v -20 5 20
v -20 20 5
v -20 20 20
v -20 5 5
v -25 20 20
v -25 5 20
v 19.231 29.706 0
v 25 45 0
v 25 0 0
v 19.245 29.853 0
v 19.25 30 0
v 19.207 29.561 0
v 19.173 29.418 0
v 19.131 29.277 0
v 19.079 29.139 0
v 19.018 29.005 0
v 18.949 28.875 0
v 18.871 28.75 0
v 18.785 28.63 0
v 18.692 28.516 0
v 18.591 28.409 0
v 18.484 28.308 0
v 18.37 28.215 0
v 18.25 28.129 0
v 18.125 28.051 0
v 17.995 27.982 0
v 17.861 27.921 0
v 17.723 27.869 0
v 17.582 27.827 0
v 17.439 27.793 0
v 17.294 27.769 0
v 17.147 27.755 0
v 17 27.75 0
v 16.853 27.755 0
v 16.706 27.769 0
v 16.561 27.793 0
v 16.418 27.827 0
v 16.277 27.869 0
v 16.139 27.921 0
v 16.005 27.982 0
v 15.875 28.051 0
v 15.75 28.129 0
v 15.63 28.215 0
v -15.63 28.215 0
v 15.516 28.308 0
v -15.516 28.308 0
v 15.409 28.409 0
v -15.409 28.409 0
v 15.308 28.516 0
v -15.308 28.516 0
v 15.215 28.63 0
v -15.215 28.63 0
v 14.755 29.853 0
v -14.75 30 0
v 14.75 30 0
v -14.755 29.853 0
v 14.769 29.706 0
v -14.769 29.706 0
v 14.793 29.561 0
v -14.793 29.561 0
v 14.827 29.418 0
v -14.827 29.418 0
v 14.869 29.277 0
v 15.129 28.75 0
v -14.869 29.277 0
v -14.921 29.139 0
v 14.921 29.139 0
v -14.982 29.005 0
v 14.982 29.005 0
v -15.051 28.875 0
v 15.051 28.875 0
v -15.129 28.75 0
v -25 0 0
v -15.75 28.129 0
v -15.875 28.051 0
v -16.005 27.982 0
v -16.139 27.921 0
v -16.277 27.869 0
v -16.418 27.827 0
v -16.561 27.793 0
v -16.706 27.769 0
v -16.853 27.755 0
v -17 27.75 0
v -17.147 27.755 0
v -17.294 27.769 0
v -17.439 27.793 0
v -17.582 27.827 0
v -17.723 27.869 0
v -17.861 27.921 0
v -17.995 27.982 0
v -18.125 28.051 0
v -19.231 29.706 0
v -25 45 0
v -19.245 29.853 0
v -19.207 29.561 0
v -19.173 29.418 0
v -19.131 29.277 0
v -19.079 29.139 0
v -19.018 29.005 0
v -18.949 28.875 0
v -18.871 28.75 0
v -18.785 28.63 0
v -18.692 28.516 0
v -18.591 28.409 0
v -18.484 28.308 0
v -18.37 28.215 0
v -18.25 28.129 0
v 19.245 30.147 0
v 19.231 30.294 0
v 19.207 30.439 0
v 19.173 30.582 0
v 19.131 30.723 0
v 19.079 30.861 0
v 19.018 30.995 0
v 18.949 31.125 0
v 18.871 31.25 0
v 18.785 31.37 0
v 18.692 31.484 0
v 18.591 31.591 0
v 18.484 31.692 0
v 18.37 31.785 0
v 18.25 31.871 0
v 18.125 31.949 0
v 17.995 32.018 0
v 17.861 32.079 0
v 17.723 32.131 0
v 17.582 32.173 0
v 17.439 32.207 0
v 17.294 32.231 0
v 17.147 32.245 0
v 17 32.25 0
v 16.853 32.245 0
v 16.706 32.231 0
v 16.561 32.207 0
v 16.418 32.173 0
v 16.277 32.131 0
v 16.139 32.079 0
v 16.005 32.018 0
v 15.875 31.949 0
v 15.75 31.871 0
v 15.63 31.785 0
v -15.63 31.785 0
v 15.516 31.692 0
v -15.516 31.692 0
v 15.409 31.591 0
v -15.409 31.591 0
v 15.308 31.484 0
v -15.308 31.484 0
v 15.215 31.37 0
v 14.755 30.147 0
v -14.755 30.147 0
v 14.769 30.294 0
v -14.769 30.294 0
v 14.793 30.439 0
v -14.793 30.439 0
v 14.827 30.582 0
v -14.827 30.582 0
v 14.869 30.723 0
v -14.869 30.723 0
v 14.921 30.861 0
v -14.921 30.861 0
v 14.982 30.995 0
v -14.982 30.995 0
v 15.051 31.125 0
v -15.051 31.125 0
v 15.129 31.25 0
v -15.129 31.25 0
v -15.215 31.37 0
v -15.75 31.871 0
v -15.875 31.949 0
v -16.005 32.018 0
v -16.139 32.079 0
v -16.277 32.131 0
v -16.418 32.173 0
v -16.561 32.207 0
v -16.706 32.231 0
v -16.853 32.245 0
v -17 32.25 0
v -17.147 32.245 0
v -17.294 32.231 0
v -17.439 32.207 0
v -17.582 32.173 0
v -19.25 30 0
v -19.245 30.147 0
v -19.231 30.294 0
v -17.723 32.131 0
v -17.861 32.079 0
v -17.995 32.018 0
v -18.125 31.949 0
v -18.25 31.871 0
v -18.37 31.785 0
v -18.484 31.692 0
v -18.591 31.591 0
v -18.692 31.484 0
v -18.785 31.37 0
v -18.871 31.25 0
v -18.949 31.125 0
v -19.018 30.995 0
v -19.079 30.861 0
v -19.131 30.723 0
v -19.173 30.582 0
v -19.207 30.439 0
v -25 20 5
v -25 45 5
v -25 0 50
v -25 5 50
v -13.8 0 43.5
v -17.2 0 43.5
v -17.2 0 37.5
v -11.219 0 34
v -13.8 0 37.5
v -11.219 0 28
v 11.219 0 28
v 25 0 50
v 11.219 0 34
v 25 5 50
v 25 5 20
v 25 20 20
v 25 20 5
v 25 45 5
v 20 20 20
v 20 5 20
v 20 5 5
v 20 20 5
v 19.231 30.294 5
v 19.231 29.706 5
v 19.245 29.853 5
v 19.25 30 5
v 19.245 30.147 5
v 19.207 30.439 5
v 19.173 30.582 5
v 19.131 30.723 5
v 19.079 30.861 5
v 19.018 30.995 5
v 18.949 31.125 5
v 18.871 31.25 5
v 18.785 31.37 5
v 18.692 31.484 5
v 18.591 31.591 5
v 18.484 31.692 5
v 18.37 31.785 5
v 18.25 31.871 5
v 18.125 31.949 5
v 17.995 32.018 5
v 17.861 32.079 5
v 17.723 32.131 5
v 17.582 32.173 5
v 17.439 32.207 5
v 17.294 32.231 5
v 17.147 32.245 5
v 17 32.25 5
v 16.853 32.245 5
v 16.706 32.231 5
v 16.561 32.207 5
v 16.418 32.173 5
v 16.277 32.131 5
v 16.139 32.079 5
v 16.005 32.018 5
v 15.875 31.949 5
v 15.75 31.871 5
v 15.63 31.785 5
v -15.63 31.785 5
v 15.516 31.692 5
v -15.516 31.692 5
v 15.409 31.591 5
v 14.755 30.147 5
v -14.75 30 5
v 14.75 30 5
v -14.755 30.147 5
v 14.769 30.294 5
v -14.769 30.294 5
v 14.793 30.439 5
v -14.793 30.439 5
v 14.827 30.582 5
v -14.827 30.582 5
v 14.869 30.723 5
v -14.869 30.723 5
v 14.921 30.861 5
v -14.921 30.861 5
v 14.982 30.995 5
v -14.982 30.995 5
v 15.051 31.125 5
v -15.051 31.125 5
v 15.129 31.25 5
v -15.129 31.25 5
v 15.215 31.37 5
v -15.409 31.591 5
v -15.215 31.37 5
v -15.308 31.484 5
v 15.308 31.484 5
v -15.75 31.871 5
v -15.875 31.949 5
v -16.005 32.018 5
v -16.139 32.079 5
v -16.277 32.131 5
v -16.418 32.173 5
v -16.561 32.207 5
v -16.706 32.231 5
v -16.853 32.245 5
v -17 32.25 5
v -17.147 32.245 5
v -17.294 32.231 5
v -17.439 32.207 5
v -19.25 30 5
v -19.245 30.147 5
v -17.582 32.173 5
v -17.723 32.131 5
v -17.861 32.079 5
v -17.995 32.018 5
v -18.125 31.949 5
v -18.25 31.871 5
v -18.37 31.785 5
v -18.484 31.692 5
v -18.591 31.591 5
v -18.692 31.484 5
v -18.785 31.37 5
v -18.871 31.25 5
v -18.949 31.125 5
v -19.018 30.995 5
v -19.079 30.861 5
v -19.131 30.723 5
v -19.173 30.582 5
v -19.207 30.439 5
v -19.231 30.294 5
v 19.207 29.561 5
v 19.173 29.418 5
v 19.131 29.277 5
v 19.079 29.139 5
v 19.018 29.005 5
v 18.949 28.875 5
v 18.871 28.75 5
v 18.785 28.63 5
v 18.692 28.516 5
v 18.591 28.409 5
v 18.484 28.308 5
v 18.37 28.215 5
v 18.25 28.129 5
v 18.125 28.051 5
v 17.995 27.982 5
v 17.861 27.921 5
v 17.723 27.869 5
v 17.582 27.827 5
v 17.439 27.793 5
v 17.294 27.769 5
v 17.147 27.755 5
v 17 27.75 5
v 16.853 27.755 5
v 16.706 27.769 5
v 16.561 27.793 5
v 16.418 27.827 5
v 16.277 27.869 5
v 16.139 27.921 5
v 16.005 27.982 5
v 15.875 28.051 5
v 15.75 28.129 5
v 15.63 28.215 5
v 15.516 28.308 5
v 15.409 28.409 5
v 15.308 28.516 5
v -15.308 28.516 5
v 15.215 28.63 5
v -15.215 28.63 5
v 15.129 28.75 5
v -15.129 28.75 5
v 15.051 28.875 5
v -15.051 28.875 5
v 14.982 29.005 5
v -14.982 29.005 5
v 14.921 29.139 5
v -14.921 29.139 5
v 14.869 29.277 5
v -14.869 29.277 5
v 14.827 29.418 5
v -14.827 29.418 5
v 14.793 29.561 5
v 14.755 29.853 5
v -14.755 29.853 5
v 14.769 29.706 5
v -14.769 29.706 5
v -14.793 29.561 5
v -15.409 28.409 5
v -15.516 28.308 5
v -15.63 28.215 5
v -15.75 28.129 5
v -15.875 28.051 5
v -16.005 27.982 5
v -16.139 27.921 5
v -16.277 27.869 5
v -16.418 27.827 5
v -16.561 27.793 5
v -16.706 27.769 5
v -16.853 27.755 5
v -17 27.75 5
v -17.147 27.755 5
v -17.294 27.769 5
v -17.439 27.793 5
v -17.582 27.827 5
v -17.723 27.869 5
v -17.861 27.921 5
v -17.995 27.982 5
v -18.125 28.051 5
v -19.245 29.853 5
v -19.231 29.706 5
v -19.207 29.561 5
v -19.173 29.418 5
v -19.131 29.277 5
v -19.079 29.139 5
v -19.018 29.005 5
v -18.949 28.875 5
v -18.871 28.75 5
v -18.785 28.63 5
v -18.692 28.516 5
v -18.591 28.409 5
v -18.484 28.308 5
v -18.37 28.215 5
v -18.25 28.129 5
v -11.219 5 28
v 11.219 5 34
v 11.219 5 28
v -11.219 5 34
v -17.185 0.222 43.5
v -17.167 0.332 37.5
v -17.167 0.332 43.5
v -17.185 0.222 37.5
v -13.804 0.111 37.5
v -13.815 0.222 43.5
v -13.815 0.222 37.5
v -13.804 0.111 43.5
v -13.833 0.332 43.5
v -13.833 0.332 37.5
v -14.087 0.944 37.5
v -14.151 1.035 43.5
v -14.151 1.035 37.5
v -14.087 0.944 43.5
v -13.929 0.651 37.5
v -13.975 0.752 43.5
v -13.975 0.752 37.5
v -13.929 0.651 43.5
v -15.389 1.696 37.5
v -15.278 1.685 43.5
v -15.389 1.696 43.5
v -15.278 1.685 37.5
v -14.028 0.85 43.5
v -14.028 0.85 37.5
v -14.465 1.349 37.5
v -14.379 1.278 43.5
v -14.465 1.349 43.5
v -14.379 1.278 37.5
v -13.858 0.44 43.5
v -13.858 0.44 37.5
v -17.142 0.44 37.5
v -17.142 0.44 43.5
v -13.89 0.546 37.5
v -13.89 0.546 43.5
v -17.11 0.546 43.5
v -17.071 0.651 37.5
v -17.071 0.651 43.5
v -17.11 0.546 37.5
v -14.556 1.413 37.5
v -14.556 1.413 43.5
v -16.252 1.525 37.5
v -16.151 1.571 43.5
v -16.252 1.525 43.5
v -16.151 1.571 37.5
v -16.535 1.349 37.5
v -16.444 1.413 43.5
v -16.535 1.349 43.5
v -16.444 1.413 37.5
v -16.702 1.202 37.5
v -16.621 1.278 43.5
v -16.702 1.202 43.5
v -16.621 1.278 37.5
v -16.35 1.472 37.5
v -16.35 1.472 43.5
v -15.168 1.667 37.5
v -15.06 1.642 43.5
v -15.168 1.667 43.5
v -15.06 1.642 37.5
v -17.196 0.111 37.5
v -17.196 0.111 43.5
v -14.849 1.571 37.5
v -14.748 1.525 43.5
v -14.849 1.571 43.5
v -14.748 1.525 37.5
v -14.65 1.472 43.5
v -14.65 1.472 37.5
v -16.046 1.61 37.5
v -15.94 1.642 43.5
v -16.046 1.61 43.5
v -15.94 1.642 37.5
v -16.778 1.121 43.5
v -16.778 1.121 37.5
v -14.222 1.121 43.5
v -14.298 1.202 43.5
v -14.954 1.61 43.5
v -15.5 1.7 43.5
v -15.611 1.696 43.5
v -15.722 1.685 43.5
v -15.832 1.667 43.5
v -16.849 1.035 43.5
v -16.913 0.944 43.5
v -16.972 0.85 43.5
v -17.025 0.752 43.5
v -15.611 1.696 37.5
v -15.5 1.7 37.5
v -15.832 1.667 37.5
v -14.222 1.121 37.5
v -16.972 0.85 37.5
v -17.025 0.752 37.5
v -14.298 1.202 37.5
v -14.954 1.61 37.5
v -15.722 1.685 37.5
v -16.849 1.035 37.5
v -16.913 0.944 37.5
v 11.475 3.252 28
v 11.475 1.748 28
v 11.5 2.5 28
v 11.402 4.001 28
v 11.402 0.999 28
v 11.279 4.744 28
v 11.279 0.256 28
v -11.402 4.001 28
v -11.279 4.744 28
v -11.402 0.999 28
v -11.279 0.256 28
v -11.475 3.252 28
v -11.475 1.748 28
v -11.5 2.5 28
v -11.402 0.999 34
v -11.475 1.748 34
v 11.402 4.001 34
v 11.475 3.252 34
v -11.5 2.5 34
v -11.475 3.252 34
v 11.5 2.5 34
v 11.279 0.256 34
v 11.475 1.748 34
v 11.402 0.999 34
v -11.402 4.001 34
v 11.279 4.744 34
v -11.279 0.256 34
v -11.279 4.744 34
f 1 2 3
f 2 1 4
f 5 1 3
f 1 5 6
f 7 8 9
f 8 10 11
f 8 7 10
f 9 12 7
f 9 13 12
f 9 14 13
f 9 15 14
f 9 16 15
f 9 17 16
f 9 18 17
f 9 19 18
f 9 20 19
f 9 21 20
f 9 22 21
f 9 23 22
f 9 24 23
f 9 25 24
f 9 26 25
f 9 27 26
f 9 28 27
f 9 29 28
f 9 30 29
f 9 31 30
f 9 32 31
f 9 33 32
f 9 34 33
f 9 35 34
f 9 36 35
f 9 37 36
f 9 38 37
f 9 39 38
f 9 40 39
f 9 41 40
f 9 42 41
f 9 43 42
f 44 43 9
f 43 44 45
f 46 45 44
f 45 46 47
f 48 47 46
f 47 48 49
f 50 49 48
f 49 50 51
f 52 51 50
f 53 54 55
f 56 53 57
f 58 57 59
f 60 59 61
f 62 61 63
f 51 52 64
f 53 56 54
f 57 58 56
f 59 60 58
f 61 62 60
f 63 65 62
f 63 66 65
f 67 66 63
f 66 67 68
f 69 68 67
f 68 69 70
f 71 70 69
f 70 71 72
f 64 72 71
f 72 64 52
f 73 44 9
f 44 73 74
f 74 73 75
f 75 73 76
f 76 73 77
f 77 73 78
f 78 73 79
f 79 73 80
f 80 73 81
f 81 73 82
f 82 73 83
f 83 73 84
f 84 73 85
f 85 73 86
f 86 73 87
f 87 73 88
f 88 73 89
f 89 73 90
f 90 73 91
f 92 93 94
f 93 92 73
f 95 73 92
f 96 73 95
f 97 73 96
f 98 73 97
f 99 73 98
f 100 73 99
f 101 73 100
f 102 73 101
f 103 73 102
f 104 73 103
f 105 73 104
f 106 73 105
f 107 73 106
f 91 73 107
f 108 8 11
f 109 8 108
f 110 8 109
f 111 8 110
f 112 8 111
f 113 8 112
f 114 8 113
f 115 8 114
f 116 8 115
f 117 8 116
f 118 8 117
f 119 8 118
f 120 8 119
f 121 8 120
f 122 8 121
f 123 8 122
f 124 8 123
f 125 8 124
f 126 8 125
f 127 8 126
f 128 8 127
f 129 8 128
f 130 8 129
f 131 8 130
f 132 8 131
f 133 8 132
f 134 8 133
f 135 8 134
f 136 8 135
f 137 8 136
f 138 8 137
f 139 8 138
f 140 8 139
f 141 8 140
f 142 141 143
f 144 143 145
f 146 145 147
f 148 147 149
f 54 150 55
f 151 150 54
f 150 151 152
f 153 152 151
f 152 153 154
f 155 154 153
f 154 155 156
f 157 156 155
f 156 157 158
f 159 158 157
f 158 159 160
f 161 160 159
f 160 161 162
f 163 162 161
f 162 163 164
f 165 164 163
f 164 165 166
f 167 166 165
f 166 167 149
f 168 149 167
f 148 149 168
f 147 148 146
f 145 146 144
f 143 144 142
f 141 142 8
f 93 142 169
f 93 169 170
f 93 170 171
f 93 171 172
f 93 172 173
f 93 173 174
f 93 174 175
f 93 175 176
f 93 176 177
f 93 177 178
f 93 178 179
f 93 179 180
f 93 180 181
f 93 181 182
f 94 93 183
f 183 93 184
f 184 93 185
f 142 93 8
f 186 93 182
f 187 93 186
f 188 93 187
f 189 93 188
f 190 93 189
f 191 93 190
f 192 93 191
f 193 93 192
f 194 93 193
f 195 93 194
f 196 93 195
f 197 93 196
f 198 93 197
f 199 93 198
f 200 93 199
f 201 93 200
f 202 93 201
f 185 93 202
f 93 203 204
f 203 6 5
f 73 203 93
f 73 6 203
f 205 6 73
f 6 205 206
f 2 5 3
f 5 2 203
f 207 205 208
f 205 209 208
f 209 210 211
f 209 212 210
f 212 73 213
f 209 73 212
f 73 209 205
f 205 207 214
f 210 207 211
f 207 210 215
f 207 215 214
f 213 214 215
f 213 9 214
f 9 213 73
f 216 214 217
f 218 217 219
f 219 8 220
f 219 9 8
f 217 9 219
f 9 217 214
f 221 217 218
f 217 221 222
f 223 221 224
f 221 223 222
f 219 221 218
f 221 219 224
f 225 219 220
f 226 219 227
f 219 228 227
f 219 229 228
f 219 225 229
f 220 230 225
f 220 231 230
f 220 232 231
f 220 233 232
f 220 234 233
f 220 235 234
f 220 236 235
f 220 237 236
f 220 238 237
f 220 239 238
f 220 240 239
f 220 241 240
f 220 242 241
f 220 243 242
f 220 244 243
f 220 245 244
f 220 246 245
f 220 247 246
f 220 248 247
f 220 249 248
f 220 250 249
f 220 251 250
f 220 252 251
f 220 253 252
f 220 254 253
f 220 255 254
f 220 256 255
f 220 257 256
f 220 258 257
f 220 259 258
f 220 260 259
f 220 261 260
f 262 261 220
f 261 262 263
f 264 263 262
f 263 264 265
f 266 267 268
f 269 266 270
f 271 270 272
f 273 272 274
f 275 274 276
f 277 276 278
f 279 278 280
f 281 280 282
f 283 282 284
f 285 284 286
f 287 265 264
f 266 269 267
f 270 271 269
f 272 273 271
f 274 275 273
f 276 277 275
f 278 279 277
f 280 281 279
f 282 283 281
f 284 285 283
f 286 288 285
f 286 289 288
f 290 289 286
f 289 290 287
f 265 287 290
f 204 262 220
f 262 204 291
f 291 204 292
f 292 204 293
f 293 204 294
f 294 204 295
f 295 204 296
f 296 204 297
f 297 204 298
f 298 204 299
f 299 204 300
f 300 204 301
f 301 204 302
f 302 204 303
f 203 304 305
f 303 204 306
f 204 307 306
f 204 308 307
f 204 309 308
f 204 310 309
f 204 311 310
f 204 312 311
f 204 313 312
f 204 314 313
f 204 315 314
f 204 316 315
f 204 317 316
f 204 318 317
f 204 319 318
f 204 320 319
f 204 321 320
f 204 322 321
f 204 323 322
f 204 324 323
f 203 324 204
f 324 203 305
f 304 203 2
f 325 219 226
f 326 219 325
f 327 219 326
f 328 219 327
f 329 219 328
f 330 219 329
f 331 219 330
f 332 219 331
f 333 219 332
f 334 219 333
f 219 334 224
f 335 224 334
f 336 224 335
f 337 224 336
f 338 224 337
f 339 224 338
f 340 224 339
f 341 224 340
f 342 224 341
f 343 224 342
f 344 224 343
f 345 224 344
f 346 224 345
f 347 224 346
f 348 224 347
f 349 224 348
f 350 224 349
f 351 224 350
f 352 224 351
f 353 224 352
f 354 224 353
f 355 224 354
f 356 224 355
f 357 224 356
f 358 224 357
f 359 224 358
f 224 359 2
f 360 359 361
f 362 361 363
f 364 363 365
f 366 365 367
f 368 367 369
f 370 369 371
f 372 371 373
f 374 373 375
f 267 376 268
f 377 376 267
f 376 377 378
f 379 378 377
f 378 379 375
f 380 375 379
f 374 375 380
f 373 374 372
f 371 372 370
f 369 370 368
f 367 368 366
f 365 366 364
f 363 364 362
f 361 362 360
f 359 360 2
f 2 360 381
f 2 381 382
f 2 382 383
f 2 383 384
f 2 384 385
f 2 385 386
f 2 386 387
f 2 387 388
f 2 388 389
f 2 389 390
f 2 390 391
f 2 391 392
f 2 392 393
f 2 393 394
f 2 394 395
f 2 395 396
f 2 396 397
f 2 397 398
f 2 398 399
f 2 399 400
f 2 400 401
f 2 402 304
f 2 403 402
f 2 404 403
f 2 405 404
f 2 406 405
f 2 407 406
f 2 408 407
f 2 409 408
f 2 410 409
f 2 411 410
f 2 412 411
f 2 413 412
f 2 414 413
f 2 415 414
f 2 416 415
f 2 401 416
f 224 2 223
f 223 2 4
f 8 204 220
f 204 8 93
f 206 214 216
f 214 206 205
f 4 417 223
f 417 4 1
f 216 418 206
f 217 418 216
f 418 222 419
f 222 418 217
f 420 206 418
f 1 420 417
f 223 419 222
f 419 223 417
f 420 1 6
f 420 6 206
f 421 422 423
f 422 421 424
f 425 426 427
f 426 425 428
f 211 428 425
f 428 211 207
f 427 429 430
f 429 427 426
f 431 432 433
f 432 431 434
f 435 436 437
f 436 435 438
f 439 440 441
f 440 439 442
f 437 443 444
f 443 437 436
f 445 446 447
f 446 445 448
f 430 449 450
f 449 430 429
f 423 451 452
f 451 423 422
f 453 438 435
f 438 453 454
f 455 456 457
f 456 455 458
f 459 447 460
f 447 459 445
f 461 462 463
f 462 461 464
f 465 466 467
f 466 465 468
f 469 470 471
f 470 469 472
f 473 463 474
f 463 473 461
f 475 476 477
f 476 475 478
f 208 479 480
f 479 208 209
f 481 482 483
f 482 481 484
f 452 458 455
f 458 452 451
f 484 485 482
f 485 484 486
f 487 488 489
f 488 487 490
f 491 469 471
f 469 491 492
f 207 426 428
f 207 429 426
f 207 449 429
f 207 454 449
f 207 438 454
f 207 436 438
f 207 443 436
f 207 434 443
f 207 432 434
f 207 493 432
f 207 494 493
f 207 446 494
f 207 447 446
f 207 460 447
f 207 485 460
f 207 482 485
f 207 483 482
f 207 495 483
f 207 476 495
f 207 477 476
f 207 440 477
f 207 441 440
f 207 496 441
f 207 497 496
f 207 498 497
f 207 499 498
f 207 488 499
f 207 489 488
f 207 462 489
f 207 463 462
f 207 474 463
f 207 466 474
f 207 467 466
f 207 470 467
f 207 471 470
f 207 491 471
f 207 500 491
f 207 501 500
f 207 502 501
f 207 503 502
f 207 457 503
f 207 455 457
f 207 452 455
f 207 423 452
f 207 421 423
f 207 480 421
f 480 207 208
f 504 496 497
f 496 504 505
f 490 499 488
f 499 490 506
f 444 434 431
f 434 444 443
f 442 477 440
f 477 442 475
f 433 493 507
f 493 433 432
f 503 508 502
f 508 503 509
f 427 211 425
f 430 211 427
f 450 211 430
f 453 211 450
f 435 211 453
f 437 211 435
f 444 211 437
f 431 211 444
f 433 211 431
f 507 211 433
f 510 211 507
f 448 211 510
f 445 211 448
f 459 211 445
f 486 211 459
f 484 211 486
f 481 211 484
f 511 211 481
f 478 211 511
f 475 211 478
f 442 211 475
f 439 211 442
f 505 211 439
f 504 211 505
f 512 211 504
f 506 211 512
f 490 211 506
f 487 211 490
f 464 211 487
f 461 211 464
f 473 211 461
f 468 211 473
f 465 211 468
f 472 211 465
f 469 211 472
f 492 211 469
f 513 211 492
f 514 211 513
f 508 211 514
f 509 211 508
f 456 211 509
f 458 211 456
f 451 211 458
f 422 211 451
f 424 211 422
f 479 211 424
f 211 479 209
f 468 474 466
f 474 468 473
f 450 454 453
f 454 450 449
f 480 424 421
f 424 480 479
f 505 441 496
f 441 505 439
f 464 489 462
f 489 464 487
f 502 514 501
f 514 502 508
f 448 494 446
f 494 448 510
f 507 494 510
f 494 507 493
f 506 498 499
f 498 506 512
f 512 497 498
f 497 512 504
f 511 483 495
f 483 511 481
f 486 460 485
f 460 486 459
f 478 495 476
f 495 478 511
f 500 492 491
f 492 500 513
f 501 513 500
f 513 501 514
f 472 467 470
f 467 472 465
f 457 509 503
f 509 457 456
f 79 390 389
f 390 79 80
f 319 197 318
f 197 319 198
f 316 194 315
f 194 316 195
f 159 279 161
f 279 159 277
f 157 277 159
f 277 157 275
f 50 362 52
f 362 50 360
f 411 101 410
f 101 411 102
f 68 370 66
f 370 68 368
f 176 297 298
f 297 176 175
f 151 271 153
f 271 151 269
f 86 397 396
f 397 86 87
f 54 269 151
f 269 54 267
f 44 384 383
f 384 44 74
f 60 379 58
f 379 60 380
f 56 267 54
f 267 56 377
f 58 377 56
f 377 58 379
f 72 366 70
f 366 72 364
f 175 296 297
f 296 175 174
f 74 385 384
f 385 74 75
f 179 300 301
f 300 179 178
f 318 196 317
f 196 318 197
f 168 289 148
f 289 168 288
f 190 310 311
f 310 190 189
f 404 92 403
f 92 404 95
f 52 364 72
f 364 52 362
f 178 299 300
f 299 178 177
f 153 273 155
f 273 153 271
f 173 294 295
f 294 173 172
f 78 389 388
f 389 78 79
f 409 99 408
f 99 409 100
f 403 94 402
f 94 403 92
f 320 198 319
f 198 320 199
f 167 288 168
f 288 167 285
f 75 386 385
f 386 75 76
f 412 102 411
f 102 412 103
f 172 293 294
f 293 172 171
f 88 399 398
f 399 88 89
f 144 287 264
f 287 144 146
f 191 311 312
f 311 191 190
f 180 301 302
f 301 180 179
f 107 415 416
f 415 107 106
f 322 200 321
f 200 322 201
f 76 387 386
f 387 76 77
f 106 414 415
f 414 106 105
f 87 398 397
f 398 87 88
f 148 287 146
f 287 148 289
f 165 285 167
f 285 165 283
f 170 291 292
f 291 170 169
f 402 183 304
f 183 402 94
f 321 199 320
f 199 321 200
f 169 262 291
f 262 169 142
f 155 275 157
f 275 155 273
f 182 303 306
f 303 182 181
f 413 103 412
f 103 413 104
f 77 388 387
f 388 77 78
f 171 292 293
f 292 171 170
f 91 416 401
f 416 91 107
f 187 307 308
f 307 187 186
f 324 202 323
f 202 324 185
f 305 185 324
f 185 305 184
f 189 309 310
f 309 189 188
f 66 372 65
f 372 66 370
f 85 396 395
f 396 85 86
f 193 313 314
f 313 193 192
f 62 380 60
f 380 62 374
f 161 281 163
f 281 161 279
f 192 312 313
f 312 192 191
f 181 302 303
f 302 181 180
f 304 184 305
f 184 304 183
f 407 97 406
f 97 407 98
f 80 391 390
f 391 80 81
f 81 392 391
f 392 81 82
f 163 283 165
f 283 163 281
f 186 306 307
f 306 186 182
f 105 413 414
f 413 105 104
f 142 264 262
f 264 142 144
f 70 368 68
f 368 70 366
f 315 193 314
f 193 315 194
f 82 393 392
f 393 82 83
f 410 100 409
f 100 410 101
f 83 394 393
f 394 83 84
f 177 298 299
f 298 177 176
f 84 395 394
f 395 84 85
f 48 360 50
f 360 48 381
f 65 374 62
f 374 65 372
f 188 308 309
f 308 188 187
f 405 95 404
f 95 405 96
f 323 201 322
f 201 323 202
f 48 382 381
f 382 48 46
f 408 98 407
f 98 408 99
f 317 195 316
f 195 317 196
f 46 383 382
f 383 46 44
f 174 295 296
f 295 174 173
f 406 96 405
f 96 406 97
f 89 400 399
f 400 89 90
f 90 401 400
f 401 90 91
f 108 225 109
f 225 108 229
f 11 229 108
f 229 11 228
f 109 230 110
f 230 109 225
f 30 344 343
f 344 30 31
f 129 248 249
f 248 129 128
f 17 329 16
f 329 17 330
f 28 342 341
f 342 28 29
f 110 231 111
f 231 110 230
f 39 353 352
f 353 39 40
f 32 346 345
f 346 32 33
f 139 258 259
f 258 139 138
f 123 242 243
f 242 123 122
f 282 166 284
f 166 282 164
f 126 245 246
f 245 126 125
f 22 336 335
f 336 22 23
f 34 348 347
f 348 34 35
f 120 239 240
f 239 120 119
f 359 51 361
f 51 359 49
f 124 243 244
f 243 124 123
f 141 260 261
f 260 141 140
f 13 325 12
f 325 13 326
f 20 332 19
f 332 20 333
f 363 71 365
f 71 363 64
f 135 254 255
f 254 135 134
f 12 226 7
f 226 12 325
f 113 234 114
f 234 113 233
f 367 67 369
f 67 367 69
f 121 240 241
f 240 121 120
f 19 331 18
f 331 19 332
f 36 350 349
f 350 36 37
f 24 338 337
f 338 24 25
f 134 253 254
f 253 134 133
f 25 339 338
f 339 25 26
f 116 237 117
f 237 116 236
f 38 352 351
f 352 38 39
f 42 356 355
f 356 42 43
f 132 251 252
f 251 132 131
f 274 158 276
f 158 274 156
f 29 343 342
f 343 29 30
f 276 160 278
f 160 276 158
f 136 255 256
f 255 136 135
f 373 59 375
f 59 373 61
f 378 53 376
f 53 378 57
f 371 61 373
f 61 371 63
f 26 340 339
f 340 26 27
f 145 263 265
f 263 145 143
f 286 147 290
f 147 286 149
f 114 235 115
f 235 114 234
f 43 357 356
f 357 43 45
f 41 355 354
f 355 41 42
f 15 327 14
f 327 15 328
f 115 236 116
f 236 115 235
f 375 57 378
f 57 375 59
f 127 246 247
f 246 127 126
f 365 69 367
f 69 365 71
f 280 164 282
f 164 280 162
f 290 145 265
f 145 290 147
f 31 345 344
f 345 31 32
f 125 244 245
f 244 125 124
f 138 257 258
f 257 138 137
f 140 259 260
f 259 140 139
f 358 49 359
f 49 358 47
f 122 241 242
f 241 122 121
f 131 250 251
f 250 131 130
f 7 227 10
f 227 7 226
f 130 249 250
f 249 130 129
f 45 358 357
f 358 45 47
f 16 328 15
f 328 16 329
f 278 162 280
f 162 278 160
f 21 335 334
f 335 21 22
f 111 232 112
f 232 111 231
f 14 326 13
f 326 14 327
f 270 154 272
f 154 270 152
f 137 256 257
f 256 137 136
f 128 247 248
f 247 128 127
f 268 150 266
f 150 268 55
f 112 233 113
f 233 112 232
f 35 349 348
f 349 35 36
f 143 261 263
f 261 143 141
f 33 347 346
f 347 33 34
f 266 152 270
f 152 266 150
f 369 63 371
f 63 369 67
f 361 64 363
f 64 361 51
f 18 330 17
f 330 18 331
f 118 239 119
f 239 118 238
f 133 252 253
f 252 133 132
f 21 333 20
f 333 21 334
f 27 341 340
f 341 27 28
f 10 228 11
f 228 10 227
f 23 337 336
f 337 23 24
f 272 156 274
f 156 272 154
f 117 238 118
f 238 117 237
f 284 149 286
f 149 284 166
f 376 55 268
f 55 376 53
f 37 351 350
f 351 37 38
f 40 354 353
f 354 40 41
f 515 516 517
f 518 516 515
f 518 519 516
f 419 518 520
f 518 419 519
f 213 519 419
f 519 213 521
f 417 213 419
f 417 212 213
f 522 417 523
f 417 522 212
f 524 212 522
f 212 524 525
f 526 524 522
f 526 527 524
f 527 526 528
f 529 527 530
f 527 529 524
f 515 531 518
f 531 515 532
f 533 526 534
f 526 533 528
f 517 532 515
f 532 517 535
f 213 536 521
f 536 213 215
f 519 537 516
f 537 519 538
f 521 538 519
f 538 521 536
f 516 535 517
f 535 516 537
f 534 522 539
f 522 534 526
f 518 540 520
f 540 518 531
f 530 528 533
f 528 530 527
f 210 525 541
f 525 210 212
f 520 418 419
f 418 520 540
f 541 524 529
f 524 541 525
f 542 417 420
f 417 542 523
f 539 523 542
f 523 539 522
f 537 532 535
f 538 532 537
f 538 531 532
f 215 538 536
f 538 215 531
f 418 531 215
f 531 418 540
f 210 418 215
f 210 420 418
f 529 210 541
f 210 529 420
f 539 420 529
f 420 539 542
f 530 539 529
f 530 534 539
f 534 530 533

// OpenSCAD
// NEMA 17 stepper motor L-shaped mounting bracket
// Print orientation: base plate on the bed, vertical plate builds upward (+Z)

// ---------------- Parameters ----------------
plate_x      = 50;     // base plate length along X (mm)
plate_y      = 45;     // base plate width along Y (mm)
plate_t      = 5;      // base plate thickness along Z (mm)

hole_m4_x    = 17;     // M4 through-hole offset from centre in X (mm)
hole_m4_y    = 30;     // M4 through-hole Y position (mm)

plate_z      = 50;     // vertical motor plate height (mm)
boss_d       = 23;     // motor centring boss hole diameter (mm)
boss_x       = 0;      // boss hole centre X (mm)
boss_z       = 28;     // boss hole centre Z (mm)

screw_d      = 3.4;    // M3 screw hole diameter (mm)
screw_pitch  = 31;     // M3 screw hole square pattern size (mm)

gusset_t     = 5;      // gusset thickness along X (mm)
gusset_y     = 20;     // gusset leg along +Y (mm)
gusset_z     = 20;     // gusset leg along +Z (mm)

eps          = 0.5;    // cutter overshoot past faces (mm)

$fn = 96;

// ---------------- Model ----------------
difference() {
    union() {
        // Base plate
        translate([-plate_x/2, 0, 0])
            cube([plate_x, plate_y, plate_t]);

        // Vertical motor plate
        translate([-plate_x/2, 0, 0])
            cube([plate_x, 5, plate_z]);

        // Gussets, flush with left and right edges
        for (sx = [-1, 1])
            translate([sx > 0 ? plate_x/2 - gusset_t : -plate_x/2, 0, 0])
                cube([gusset_t, gusset_y, gusset_z]);
    }

    // Through-holes
    translate([-hole_m4_x, hole_m4_y, -eps])
        cylinder(d = 4.5, h = plate_t + 2*eps);

    translate([hole_m4_x, hole_m4_y, -eps])
        cylinder(d = 4.5, h = plate_t + 2*eps);

    // Motor centring boss hole
    translate([boss_x, 2.5, boss_z])
        cylinder(d = boss_d, h = plate_t + 2*eps);

    // M3 screw holes on square pattern
    for (i = [0:3])
        translate([
            (i % 2 == 0) ? -screw_pitch/2 : screw_pitch/2,
            (i / 2) * screw_pitch,
            plate_z * 0.75
        ])
            cylinder(d = screw_d, h = plate_t + 2*eps);
}
